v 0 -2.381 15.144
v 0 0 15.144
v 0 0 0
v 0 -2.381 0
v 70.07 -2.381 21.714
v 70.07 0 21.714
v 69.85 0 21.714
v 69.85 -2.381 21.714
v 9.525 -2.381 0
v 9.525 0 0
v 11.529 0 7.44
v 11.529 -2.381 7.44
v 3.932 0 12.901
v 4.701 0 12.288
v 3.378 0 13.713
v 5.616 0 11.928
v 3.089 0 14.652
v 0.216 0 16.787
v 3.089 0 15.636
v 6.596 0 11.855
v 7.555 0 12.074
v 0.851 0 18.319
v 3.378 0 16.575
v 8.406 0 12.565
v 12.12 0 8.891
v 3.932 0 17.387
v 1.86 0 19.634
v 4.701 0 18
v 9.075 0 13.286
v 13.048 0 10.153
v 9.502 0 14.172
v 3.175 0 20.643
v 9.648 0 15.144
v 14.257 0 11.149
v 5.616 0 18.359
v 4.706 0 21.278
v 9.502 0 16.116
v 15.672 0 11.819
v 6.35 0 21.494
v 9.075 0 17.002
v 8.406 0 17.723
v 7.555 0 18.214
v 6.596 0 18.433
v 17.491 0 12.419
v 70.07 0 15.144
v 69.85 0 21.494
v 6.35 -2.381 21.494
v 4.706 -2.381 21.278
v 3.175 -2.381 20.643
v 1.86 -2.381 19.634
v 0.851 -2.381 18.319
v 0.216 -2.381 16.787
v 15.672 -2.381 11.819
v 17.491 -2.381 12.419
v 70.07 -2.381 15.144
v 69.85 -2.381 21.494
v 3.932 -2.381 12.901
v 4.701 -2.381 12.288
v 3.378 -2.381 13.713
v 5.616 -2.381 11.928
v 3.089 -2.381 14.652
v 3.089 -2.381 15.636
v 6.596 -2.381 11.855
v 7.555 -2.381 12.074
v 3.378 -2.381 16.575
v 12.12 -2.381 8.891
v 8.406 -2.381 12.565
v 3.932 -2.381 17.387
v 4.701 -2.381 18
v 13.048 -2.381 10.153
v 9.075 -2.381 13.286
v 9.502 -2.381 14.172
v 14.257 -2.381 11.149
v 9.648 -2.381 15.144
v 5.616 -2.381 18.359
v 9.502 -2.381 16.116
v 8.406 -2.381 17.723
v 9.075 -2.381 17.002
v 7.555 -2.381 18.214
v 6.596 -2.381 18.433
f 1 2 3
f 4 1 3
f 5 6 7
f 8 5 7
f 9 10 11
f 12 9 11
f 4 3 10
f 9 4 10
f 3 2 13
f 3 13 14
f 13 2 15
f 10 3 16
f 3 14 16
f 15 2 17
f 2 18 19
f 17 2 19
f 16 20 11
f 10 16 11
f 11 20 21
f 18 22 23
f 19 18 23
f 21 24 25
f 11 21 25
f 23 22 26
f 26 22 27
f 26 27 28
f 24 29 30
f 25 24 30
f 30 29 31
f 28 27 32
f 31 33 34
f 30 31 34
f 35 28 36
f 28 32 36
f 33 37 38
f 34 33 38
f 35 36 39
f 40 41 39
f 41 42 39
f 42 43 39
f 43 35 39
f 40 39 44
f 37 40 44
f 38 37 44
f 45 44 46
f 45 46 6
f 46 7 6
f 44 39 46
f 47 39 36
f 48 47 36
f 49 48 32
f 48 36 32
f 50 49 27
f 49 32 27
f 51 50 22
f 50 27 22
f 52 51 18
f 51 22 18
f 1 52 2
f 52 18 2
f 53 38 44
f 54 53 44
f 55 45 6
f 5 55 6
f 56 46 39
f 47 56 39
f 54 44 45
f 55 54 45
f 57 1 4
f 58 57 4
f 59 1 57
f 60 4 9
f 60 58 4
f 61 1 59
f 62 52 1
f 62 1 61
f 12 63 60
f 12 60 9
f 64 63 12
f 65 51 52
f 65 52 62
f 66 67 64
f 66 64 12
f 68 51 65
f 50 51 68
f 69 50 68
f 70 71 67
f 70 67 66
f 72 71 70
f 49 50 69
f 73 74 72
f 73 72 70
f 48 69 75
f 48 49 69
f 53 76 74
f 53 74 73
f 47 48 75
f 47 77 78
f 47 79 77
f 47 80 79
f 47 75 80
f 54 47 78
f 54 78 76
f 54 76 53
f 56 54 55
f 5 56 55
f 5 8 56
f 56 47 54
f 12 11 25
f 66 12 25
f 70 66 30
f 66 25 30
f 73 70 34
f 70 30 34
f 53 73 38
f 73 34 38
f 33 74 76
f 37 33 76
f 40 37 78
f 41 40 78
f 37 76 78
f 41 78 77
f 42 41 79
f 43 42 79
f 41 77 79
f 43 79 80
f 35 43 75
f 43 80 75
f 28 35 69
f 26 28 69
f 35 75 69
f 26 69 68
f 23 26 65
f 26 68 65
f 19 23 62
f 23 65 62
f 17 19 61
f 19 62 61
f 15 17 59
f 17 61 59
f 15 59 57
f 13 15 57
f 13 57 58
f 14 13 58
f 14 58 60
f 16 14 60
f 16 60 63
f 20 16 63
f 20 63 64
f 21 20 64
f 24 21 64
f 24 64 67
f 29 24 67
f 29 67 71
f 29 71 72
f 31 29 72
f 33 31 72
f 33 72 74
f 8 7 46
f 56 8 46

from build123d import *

# Parameters (mm, degrees)
F1_DEPTH = 2.38125
F2_R     = 3.2981725782
F3_DEPTH = 25.4


# Not quite as in the source:
# - a length typed as a fraction of an inch, garbled in the dataset ("3 / 203.2 mm" for 3/8 in), is restored


with BuildPart() as f1:
    # F0 (on Front) → F1 (new body)
    with BuildSketch(Plane.XZ):
        with BuildLine():
            Line((69.85, 21.4939358442), (6.35, 21.4939358442))
            ThreePointArc((6.35, 21.4939358442), (1.8598719395, 19.6340639047), (0, 15.1439358442))
            Line((0, 15.1439358442), (0, 0))
            Line((0, 0), (9.525, 0))
            Line((9.525, 0), (11.5292743985, 7.4402281731))
            ThreePointArc((11.5292743985, 7.4402281731), (13.0480987591, 10.1527436206), (15.6724793239, 11.8192351874))
            Line((15.6724793239, 11.8192351874), (17.4910178831, 12.4187755322))
            Line((17.4910178831, 12.4187755322), (70.0698060278, 15.1439358442))
            Line((70.0698060278, 15.1439358442), (69.85, 15.1439358442))
            Line((69.85, 15.1439358442), (69.85, 21.4939358442))
        make_face()
        Polygon((69.85, 21.7137452919), (69.85, 21.4939358442), (69.85, 15.1439358442), (70.0698060278, 15.1439358442), (70.0698060278, 21.7137452919), align=None)
    extrude(amount=F1_DEPTH)

    # F2 (on face) → F3 (cut)
    with BuildSketch(Plane.XZ.offset(2.38125)):
        with Locations((6.35, 15.1439358442)):
            Circle(F2_R)
    extrude(amount=-F3_DEPTH, mode=Mode.SUBTRACT)


solid = f1.part
